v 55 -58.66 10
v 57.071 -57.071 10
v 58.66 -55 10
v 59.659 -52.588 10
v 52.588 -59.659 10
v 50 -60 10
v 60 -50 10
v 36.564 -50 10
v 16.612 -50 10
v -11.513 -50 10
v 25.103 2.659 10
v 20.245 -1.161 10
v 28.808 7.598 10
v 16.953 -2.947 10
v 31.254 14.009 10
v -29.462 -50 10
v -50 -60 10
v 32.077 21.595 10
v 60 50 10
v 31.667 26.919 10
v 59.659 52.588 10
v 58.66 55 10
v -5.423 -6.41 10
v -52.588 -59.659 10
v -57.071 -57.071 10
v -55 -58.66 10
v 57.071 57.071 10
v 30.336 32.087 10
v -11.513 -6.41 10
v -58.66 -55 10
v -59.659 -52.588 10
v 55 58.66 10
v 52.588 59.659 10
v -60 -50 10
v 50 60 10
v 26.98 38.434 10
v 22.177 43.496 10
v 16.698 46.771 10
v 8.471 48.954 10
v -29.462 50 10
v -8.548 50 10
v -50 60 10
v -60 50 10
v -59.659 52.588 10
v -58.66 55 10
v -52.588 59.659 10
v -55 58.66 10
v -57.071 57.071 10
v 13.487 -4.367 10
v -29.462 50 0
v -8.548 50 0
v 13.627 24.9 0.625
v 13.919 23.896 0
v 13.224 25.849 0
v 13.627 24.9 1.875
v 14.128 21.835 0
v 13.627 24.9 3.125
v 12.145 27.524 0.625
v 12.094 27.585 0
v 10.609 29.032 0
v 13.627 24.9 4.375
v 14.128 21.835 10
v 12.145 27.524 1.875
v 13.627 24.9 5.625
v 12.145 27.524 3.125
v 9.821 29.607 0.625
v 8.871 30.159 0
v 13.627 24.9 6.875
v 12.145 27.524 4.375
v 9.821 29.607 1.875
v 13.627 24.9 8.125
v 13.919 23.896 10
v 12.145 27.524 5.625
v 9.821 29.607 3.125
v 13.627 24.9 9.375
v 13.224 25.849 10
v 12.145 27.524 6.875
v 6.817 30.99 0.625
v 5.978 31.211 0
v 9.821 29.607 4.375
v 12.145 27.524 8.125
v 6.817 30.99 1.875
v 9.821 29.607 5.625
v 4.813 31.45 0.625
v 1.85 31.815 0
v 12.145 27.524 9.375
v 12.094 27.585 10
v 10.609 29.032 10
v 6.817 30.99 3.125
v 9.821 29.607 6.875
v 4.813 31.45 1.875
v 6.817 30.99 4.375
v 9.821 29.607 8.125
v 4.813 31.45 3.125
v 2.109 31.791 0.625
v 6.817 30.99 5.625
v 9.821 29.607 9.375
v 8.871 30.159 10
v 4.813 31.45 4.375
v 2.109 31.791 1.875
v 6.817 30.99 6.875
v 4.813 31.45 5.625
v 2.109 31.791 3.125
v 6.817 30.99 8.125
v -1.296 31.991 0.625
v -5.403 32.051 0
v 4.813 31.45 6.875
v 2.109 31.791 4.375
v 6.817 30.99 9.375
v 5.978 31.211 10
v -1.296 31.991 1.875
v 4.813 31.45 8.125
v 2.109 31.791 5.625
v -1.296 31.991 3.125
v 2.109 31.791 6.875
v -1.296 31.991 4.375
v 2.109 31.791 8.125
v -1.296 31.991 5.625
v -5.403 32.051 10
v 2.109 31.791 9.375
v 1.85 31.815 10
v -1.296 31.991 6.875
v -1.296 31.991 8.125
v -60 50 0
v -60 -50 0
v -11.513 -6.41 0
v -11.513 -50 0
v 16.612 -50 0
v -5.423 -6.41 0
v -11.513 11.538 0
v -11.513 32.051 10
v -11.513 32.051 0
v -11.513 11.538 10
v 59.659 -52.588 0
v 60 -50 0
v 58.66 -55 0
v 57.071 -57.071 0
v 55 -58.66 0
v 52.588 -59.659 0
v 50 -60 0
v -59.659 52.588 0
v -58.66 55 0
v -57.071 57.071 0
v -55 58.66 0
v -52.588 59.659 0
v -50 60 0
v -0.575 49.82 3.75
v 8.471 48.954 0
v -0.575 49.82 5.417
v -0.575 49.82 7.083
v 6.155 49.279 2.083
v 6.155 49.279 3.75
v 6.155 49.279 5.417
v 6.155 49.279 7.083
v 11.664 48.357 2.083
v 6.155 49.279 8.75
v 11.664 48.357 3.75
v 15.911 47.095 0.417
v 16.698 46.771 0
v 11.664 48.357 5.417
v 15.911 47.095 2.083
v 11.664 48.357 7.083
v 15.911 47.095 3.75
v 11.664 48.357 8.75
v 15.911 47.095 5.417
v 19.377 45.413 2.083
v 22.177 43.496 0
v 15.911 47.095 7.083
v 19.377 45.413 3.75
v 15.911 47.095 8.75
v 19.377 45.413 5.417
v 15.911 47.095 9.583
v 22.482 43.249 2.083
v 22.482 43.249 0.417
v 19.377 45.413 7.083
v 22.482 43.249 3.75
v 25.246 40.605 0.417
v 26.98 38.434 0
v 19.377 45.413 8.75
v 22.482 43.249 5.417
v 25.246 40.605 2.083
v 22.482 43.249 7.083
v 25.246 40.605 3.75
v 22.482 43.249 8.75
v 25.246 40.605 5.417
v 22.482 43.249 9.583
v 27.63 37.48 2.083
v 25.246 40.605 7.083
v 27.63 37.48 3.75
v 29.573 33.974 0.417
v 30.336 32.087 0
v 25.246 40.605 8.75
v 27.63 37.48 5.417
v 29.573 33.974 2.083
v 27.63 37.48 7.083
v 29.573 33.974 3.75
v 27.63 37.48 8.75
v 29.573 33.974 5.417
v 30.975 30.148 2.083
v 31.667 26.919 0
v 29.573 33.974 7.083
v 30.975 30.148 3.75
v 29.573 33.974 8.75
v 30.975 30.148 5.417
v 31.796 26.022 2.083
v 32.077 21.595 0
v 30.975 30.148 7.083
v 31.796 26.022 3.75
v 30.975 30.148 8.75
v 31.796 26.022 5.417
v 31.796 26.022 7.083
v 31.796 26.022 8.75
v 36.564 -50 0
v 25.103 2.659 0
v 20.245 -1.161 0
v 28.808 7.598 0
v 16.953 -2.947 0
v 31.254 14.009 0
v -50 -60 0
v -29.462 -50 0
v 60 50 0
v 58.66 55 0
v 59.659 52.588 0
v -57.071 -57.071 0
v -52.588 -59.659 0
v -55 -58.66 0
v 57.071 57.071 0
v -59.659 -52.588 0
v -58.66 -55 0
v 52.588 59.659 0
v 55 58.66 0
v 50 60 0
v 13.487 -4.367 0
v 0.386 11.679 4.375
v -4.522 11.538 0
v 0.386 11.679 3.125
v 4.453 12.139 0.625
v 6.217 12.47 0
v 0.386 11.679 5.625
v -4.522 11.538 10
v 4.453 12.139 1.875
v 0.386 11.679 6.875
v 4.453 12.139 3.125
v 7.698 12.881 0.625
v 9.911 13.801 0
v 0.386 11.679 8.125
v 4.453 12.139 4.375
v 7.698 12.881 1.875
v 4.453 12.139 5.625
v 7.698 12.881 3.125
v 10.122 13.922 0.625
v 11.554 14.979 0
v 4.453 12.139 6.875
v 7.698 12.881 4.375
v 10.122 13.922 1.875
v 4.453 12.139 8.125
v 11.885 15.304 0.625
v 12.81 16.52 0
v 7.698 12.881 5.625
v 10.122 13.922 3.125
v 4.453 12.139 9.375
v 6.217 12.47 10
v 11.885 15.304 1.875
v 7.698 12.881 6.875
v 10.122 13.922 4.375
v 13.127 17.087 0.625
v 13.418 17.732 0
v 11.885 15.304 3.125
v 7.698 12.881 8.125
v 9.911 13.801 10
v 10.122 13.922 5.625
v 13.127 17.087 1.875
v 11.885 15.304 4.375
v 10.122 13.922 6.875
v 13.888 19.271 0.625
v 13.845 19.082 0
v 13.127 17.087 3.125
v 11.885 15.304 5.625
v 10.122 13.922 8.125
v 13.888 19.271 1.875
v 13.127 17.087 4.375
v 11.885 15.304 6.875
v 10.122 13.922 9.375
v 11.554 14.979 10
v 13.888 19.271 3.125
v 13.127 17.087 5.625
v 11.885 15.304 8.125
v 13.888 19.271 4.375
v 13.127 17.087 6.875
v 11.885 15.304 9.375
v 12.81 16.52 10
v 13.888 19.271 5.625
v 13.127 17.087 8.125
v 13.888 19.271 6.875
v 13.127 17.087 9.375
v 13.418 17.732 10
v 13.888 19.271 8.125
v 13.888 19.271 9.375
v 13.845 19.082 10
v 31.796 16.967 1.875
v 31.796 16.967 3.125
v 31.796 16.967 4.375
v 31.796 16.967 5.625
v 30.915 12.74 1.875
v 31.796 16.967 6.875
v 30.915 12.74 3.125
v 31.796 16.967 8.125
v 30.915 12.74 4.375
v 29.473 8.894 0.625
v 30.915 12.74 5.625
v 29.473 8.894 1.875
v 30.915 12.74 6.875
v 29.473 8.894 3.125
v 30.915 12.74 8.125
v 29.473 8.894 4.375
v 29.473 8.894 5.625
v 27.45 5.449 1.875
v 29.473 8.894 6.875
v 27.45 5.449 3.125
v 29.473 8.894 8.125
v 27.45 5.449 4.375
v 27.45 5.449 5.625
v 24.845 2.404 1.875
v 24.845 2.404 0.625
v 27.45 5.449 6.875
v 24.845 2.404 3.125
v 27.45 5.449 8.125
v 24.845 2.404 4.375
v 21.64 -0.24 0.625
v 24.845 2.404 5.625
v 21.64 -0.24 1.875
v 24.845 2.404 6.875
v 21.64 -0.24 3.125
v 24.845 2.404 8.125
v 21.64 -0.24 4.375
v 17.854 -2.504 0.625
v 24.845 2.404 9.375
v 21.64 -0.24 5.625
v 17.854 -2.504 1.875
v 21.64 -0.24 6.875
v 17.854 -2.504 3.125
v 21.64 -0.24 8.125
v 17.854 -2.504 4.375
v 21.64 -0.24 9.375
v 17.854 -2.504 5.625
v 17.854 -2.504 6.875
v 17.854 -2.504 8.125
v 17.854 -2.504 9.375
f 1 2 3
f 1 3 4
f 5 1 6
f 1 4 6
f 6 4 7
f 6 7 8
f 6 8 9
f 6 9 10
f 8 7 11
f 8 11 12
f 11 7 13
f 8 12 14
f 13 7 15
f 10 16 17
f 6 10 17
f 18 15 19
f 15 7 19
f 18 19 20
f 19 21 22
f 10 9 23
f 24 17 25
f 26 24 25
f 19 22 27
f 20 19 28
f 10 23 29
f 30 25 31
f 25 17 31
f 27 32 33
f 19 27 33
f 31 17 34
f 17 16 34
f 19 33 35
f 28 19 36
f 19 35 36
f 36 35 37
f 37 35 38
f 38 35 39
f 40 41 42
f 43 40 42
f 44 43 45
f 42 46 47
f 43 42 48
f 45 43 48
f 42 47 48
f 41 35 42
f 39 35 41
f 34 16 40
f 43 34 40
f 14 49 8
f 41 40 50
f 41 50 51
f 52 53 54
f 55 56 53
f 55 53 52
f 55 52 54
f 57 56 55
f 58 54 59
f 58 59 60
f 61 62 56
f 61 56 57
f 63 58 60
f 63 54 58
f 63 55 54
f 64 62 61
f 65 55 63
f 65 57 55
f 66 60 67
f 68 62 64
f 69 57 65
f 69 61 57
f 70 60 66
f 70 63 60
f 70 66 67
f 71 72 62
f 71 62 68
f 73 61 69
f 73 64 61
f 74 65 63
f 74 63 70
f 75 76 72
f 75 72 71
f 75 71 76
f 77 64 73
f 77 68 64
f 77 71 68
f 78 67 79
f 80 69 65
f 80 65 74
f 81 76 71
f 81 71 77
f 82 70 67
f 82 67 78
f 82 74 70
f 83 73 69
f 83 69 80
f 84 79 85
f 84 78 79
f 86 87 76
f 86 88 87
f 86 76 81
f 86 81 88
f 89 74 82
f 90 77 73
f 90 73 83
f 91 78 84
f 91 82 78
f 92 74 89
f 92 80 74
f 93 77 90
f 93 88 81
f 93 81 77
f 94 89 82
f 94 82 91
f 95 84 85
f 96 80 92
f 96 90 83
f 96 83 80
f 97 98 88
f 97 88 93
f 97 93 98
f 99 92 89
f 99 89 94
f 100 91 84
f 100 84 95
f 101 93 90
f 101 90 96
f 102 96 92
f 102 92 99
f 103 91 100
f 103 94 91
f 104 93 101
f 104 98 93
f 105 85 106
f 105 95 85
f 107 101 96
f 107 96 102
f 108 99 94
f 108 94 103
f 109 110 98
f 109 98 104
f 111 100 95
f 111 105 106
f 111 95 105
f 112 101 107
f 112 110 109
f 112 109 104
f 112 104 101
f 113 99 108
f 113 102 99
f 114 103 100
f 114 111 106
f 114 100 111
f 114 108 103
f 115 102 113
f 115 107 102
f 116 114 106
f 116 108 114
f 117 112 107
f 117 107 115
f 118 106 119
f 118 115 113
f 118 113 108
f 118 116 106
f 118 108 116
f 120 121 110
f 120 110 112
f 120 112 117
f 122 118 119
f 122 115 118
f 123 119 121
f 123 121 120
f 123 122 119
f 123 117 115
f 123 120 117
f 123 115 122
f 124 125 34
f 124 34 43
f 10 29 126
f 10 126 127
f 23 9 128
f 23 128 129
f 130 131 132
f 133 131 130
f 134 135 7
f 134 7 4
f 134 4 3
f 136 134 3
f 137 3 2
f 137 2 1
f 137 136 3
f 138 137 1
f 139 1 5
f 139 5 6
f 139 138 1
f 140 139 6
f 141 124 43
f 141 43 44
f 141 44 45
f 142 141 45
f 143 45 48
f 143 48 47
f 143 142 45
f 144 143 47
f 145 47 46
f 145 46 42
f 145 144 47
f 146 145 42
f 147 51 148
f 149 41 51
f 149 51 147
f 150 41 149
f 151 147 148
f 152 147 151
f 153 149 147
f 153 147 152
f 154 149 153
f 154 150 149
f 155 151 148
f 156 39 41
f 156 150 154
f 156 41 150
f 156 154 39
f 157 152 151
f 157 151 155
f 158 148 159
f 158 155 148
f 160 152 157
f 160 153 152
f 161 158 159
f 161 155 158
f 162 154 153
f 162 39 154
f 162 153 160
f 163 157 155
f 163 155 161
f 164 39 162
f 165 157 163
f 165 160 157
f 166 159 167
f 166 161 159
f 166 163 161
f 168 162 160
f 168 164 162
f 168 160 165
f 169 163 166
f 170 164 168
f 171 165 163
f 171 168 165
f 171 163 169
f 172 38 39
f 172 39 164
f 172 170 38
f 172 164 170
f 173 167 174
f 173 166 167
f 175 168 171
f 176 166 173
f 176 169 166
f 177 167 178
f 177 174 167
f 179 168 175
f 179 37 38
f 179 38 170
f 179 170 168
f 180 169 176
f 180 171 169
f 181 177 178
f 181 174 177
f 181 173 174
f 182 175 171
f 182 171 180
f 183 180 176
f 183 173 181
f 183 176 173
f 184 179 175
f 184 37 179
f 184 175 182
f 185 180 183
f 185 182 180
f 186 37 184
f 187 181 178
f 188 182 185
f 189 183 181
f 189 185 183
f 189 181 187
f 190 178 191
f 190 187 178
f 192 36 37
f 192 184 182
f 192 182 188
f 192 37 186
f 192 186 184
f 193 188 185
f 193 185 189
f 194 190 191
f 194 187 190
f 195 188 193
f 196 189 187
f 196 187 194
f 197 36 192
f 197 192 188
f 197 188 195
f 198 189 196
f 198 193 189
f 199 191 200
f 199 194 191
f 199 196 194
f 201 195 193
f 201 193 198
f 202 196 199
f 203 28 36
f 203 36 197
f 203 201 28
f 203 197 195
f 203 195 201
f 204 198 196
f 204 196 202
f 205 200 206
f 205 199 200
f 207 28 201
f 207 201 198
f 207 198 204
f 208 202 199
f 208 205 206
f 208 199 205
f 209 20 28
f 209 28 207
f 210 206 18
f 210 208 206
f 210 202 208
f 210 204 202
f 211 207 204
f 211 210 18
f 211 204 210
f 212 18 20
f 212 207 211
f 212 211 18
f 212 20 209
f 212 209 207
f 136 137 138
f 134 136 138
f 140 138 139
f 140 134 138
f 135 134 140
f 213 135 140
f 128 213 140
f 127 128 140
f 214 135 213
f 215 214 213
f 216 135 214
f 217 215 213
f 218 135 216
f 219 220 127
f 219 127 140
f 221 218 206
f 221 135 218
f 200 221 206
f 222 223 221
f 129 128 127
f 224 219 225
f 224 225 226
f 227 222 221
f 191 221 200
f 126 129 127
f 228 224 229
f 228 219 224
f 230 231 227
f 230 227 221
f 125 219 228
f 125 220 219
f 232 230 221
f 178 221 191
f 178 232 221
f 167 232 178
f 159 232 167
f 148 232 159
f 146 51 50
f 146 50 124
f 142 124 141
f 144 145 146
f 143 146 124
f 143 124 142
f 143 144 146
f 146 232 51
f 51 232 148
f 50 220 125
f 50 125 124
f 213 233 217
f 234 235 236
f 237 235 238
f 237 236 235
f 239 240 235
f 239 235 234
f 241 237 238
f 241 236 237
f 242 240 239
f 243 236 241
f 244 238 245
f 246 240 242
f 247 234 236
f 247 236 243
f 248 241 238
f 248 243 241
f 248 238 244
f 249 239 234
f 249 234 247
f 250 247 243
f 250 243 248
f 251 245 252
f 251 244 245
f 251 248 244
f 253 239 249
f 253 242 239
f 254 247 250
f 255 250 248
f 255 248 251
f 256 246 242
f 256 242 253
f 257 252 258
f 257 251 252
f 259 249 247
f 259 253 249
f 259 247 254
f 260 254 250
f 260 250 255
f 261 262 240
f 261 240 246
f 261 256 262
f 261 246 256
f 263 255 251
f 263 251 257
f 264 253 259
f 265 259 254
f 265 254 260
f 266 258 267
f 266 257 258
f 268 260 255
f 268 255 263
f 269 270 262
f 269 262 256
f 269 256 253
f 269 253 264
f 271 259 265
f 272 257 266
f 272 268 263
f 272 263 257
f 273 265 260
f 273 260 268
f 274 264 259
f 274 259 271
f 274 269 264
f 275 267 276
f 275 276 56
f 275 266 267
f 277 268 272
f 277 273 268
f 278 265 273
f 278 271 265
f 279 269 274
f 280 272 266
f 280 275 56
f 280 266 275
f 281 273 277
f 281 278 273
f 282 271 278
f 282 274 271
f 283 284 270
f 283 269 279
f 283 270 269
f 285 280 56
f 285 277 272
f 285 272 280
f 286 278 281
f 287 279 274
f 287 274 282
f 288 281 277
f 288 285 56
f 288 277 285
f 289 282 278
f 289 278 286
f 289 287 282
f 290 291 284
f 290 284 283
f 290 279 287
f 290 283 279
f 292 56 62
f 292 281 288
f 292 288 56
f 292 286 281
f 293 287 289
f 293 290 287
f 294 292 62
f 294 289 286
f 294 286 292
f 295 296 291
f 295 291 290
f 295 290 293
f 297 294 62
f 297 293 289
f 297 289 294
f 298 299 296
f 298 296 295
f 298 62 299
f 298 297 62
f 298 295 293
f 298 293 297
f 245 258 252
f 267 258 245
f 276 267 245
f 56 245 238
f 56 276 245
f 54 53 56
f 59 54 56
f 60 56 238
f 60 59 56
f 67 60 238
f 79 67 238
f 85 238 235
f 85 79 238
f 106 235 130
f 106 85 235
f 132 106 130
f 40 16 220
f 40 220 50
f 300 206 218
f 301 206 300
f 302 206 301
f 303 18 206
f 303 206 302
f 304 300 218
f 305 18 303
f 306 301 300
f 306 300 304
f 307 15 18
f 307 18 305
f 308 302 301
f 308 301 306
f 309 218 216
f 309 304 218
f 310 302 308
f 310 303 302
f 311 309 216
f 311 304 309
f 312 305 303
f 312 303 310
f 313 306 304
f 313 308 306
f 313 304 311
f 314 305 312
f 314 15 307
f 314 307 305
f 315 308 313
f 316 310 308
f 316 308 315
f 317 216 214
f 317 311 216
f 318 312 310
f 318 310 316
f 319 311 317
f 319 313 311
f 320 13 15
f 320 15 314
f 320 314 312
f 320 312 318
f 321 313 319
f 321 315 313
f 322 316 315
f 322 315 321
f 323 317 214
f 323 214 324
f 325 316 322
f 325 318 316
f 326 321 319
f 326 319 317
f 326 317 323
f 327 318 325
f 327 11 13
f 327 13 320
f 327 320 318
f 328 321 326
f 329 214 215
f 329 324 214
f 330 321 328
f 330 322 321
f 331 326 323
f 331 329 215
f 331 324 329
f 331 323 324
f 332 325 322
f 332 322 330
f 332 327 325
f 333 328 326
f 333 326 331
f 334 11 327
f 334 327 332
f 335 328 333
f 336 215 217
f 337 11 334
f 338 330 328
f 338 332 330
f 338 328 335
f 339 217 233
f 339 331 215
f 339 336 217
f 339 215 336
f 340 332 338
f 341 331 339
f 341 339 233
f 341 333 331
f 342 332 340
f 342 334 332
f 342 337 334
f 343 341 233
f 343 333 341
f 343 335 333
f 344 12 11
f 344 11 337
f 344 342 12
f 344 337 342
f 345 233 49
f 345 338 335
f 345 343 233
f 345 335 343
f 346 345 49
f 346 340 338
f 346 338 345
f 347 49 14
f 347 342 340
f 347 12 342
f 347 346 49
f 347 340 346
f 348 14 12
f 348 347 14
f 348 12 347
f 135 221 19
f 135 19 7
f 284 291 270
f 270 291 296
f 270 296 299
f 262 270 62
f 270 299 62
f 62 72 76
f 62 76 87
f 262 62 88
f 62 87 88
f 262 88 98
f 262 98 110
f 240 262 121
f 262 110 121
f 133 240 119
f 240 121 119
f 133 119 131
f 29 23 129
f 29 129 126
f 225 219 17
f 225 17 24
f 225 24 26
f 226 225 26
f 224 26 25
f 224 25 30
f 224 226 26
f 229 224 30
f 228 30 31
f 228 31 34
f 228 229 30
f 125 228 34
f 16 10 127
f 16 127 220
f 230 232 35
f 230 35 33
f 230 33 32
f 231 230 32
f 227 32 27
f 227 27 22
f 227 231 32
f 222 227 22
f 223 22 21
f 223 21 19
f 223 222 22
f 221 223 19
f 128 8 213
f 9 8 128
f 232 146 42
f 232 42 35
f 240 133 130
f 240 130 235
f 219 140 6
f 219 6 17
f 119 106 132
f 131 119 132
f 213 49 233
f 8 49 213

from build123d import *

# Parameters (mm, degrees)
BOSS_EXTRUDE1_DEPTH = 10
CUT_EXTRUDE31_DEPTH = 10


with BuildPart() as part:
    # Sketch1 → Boss-Extrude1 (new body)
    with BuildSketch(Plane.XY):
        with BuildLine():
            Line((-50, 60), (50, 60))
            ThreePointArc((50, 60), (57.071067812, 57.071067812), (60, 50))
            Line((60, 50), (60, -50))
            ThreePointArc((60, -50), (57.071067812, -57.071067812), (50, -60))
            Line((50, -60), (-50, -60))
            ThreePointArc((-50, -60), (-57.071067812, -57.071067812), (-60, -50))
            Line((-60, -50), (-60, 50))
            ThreePointArc((-60, 50), (-57.071067812, 57.071067812), (-50, 60))
        make_face()
    extrude(amount=BOSS_EXTRUDE1_DEPTH)

    # Sketch2 → Cut-Extrude31 (cut)
    with BuildSketch(Plane.XY.offset(10)):
        with BuildLine():
            Line((-29.461538462, 50), (-8.548076923, 50))
            add(Edge.make_bspline(
                [(-8.548076923, 50), (-7.165703481, 49.995093368), (-4.507009959, 49.985656532), (-0.673319115, 49.836768254), (2.848453144, 49.629577996), (6.06352112, 49.313400163), (8.970509353, 48.894186574), (11.572331327, 48.400003124), (13.868910992, 47.836775133), (15.879616825, 47.134948618), (17.694179412, 46.34329895), (19.385604016, 45.433678965), (20.991205978, 44.41621757), (22.500253584, 43.264142601), (23.925860812, 41.998179603), (25.270717156, 40.617054259), (26.515818548, 39.109055197), (27.653455271, 37.483711056), (28.690319571, 35.77388629), (29.606690143, 33.977233301), (30.351884216, 32.092502634), (31.010343063, 30.146932723), (31.484609638, 28.112711264), (31.814455103, 26.009641747), (32.055955049, 23.830321144), (32.069840141, 22.349787486), (32.076923077, 21.594551282)],
                knots=[0, 0, 0, 0, 1.749336639, 3.364467119, 4.854658419, 6.213483162, 7.451590619, 8.570285859, 9.5643256, 10.440900261, 11.26203566, 12.067320669, 12.869050712, 13.665104639, 14.467235401, 15.27997916, 16.102287765, 16.939272006, 17.78853747, 18.631303466, 19.488103222, 20.351255419, 21.228522269, 22.127379805, 23.044756219, 24, 24, 24, 24], degree=3))
            add(Edge.make_bspline(
                [(32.076923077, 21.594551282), (32.058524158, 20.80625818), (32.02244723, 19.260559079), (31.828117272, 16.990053166), (31.472943153, 14.817791924), (30.93498028, 12.750135467), (30.316661832, 10.761349398), (29.494456904, 8.888128065), (28.566517379, 7.103228176), (27.464430716, 5.431897819), (26.254944445, 3.837013405), (24.848337353, 2.379680875), (23.335735975, 0.981574121), (21.632111478, -0.269734192), (19.812561212, -1.45885301), (17.840932629, -2.536511333), (15.730093252, -3.529799011), (14.246068635, -4.083724833), (13.487179487, -4.366987179)],
                knots=[0, 0, 0, 0, 1.099860209, 2.156625411, 3.176576793, 4.16617041, 5.135385252, 6.078461593, 7.016046972, 7.938469504, 8.868247731, 9.803980173, 10.76021508, 11.73834243, 12.748633912, 13.790971185, 14.870363756, 16, 16, 16, 16], degree=3))
            Line((13.487179487, -4.366987179), (36.564102564, -50))
            Line((36.564102564, -50), (16.612179487, -50))
            Line((16.612179487, -50), (-5.423076923, -6.41025641))
            Line((-5.423076923, -6.41025641), (-11.512820513, -6.41025641))
            Line((-11.512820513, -6.41025641), (-11.512820513, -50))
            Line((-11.512820513, -50), (-29.461538462, -50))
            Line((-29.461538462, -50), (-29.461538462, 50))
        make_face()
        with BuildLine():
            Line((-11.512820513, 11.538461538), (-4.521634615, 11.538461538))
            add(Edge.make_bspline(
                [(-4.521634615, 11.538461538), (-3.666904025, 11.548088089), (-2.030278604, 11.566520864), (0.323403709, 11.652019718), (2.461108572, 11.858029706), (4.392016012, 12.118315626), (6.12584218, 12.418853311), (7.647121957, 12.849542059), (8.979295943, 13.311035956), (10.106577827, 13.884553157), (11.069701566, 14.536766606), (11.901297271, 15.277697296), (12.589146155, 16.135230226), (13.155280872, 17.086061349), (13.59567213, 18.138600533), (13.917124011, 19.281293282), (14.096768077, 20.527156336), (14.117436738, 21.386971484), (14.128205128, 21.834935897)],
                knots=[0, 0, 0, 0, 1.688639943, 3.233382647, 4.650958383, 5.928841754, 7.082724185, 8.122798841, 9.049171256, 9.863274652, 10.613301712, 11.341792392, 12.054588806, 12.776240173, 13.521029143, 14.301969904, 15.115324896, 16, 16, 16, 16], degree=3))
            add(Edge.make_bspline(
                [(14.128205128, 21.834935897), (14.1078465, 22.364910501), (14.067855748, 23.405947401), (13.67102325, 24.904675503), (13.03935163, 26.291850903), (12.173502851, 27.561205998), (11.083078881, 28.6740103), (9.831731343, 29.654956154), (8.392453139, 30.430614737), (7.059789828, 30.94223088), (5.847377715, 31.248336096), (4.753214033, 31.476442996), (3.486165902, 31.638108903), (2.04527677, 31.809584375), (0.434219512, 31.920777538), (-1.355787098, 32.001926384), (-3.319602174, 32.035128363), (-4.688567797, 32.045742451), (-5.403044872, 32.051282051)],
                knots=[0, 0, 0, 0, 1.020303359, 2.004196876, 2.966617323, 3.9489082, 4.950758222, 5.960522915, 7.003732012, 8.091992268, 8.70421221, 9.413913587, 10.24622431, 11.166358409, 12.212345909, 13.359657661, 14.621978493, 16, 16, 16, 16], degree=3))
            Line((-5.403044872, 32.051282051), (-11.512820513, 32.051282051))
            Line((-11.512820513, 32.051282051), (-11.512820513, 11.538461538))
        make_face(mode=Mode.SUBTRACT)
    extrude(amount=-CUT_EXTRUDE31_DEPTH, mode=Mode.SUBTRACT)


with BuildPart() as cut_extrude31_piece_1:
    # of the separate pieces the step leaves, piece 1, a body of its own (cut_extrude31_pieces)
    add(part.part.solids().sort_by_distance((-50, 60, 0))[0])


with BuildPart() as cut_extrude31_piece_2:
    # of the separate pieces the step leaves, piece 2, a body of its own (cut_extrude31_pieces)
    add(part.part.solids().sort_by_distance((-11.512820513, 11.538461538, 0))[0])


solid = Compound([cut_extrude31_piece_1.part, cut_extrude31_piece_2.part])
